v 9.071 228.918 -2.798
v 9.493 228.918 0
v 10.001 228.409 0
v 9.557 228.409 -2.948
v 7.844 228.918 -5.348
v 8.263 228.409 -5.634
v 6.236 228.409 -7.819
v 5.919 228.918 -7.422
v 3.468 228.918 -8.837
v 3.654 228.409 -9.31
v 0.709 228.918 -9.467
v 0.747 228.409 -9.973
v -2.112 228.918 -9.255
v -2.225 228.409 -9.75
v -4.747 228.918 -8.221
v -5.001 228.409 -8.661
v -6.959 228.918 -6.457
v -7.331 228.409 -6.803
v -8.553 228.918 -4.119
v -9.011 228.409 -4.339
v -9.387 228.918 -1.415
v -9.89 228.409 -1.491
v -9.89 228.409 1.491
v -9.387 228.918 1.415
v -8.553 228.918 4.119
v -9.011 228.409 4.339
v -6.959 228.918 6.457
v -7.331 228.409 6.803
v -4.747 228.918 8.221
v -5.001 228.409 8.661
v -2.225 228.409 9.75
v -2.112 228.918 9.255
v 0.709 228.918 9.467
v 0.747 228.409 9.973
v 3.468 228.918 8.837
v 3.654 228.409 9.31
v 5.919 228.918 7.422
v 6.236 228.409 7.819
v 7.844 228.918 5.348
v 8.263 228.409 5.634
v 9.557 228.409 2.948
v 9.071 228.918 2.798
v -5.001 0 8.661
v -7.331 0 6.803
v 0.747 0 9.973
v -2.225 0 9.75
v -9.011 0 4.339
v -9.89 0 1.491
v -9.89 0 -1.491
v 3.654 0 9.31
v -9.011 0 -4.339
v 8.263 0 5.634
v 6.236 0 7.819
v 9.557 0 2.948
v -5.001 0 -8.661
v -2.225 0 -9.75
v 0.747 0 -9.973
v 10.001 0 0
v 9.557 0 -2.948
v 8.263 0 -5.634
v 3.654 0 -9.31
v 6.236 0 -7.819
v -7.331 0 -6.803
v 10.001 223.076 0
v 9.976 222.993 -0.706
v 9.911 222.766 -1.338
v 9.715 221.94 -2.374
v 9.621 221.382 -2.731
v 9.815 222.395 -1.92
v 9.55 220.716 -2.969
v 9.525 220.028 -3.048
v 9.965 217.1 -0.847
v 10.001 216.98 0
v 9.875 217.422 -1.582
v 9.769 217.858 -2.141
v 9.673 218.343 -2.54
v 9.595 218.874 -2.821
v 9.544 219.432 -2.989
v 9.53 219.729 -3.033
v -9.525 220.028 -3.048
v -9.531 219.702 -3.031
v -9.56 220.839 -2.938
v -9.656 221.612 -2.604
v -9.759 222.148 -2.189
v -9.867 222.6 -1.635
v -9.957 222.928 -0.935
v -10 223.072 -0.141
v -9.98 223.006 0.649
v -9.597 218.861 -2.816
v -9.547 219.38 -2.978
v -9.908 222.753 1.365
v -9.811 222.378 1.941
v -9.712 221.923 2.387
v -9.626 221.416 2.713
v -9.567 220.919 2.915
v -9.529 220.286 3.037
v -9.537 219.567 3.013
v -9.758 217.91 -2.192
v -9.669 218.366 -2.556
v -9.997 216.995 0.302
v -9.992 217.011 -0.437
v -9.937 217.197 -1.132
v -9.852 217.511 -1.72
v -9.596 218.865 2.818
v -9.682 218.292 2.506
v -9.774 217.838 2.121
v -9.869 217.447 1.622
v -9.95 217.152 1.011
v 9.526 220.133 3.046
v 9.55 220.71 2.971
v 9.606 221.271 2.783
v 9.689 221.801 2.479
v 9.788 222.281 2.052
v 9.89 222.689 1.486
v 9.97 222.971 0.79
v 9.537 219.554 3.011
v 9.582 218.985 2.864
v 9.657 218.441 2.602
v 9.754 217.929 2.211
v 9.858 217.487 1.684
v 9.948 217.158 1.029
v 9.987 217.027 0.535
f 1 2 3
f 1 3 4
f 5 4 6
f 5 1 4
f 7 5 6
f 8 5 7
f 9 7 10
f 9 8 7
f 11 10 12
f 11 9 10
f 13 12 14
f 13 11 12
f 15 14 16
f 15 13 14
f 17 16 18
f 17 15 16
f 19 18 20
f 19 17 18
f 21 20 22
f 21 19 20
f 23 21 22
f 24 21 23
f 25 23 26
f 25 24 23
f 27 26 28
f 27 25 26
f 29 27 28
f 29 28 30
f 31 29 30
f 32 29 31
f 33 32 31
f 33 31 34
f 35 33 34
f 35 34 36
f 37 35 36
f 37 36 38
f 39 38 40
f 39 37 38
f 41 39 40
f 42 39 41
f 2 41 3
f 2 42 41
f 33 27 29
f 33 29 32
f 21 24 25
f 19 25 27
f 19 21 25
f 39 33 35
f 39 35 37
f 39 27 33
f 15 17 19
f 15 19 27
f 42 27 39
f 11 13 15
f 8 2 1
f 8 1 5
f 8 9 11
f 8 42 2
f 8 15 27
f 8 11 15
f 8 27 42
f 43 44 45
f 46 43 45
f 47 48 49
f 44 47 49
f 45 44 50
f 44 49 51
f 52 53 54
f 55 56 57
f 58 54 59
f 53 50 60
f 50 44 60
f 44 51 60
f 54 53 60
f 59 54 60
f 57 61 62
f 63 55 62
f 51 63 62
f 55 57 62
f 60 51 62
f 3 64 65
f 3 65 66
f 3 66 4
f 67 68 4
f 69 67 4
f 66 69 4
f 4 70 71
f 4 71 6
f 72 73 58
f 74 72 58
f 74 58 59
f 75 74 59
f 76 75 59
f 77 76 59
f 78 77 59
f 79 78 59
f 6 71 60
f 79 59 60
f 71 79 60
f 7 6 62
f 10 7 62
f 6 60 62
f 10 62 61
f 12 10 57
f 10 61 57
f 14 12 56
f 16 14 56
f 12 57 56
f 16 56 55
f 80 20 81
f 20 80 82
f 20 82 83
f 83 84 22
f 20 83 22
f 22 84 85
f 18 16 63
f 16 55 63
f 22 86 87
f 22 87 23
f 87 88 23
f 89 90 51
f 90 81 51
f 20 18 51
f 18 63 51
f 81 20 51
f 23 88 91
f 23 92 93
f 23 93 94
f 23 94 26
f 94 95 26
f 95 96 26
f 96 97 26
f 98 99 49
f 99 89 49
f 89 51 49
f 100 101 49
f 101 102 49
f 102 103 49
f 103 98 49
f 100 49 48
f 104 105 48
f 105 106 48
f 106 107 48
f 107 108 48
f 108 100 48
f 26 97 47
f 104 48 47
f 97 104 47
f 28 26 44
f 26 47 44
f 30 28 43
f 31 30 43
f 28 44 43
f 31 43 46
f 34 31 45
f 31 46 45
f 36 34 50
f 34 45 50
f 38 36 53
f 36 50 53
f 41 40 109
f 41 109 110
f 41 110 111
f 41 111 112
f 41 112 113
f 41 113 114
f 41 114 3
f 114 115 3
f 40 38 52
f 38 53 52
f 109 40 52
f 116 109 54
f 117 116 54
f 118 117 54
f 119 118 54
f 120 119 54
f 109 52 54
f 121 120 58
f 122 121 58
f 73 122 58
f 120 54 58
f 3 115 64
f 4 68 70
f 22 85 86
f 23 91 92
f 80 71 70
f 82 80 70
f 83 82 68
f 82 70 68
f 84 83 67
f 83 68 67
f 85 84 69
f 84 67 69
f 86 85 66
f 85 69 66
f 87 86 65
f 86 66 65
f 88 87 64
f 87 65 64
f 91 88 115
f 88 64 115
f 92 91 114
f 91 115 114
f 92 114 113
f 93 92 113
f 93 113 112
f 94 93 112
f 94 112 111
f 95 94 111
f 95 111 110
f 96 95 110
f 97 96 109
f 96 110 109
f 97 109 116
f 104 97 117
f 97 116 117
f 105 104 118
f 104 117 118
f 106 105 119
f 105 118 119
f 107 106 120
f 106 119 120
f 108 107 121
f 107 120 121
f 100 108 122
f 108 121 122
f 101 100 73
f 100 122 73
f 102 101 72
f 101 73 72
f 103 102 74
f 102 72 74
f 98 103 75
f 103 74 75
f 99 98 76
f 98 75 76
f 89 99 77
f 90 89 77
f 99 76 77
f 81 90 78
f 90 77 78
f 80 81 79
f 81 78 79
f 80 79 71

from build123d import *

# Parameters (mm, degrees)
SKETCH1_R           = 10.00125
BOSS_EXTRUDE1_DEPTH = 203.2
SKETCH2_R           = 10.00125
BOSS_EXTRUDE2_DEPTH = 25.7175
SKETCH4_R           = 3.048
CUT_EXTRUDE1_DEPTH  = 25.4
CHAMFER1_SIZE       = 0.508


with BuildPart() as part:
    # Sketch1 → Boss-Extrude1 (new body)
    with BuildSketch(Plane(origin=(0, 0, 0), x_dir=(1, 0, 0), z_dir=(0, 1, 0))):
        Circle(SKETCH1_R)
    extrude(amount=BOSS_EXTRUDE1_DEPTH)

    # Sketch2 → Boss-Extrude2 (add)
    with BuildSketch(Plane(origin=(0, 203.2, 0), x_dir=(1, 0, 0), z_dir=(0, 1, 0))):
        Circle(SKETCH2_R)
    extrude(amount=BOSS_EXTRUDE2_DEPTH)

    # Sketch4 → Cut-Extrude1 (cut)
    with BuildSketch(Plane(origin=(10.00125, 0, 0), x_dir=(0, 0, -1), z_dir=(1, 0, 0))):
        with Locations((0, 220.0275)):
            Circle(SKETCH4_R)
    extrude(amount=-CUT_EXTRUDE1_DEPTH, mode=Mode.SUBTRACT)

    # Chamfer1
    chamfer1_edges = [part.edges().sort_by_distance(p)[0] for p in [
        (-10.00125, 228.9175, 0),
    ]]
    chamfer(chamfer1_edges, length=CHAMFER1_SIZE)


solid = part.part
